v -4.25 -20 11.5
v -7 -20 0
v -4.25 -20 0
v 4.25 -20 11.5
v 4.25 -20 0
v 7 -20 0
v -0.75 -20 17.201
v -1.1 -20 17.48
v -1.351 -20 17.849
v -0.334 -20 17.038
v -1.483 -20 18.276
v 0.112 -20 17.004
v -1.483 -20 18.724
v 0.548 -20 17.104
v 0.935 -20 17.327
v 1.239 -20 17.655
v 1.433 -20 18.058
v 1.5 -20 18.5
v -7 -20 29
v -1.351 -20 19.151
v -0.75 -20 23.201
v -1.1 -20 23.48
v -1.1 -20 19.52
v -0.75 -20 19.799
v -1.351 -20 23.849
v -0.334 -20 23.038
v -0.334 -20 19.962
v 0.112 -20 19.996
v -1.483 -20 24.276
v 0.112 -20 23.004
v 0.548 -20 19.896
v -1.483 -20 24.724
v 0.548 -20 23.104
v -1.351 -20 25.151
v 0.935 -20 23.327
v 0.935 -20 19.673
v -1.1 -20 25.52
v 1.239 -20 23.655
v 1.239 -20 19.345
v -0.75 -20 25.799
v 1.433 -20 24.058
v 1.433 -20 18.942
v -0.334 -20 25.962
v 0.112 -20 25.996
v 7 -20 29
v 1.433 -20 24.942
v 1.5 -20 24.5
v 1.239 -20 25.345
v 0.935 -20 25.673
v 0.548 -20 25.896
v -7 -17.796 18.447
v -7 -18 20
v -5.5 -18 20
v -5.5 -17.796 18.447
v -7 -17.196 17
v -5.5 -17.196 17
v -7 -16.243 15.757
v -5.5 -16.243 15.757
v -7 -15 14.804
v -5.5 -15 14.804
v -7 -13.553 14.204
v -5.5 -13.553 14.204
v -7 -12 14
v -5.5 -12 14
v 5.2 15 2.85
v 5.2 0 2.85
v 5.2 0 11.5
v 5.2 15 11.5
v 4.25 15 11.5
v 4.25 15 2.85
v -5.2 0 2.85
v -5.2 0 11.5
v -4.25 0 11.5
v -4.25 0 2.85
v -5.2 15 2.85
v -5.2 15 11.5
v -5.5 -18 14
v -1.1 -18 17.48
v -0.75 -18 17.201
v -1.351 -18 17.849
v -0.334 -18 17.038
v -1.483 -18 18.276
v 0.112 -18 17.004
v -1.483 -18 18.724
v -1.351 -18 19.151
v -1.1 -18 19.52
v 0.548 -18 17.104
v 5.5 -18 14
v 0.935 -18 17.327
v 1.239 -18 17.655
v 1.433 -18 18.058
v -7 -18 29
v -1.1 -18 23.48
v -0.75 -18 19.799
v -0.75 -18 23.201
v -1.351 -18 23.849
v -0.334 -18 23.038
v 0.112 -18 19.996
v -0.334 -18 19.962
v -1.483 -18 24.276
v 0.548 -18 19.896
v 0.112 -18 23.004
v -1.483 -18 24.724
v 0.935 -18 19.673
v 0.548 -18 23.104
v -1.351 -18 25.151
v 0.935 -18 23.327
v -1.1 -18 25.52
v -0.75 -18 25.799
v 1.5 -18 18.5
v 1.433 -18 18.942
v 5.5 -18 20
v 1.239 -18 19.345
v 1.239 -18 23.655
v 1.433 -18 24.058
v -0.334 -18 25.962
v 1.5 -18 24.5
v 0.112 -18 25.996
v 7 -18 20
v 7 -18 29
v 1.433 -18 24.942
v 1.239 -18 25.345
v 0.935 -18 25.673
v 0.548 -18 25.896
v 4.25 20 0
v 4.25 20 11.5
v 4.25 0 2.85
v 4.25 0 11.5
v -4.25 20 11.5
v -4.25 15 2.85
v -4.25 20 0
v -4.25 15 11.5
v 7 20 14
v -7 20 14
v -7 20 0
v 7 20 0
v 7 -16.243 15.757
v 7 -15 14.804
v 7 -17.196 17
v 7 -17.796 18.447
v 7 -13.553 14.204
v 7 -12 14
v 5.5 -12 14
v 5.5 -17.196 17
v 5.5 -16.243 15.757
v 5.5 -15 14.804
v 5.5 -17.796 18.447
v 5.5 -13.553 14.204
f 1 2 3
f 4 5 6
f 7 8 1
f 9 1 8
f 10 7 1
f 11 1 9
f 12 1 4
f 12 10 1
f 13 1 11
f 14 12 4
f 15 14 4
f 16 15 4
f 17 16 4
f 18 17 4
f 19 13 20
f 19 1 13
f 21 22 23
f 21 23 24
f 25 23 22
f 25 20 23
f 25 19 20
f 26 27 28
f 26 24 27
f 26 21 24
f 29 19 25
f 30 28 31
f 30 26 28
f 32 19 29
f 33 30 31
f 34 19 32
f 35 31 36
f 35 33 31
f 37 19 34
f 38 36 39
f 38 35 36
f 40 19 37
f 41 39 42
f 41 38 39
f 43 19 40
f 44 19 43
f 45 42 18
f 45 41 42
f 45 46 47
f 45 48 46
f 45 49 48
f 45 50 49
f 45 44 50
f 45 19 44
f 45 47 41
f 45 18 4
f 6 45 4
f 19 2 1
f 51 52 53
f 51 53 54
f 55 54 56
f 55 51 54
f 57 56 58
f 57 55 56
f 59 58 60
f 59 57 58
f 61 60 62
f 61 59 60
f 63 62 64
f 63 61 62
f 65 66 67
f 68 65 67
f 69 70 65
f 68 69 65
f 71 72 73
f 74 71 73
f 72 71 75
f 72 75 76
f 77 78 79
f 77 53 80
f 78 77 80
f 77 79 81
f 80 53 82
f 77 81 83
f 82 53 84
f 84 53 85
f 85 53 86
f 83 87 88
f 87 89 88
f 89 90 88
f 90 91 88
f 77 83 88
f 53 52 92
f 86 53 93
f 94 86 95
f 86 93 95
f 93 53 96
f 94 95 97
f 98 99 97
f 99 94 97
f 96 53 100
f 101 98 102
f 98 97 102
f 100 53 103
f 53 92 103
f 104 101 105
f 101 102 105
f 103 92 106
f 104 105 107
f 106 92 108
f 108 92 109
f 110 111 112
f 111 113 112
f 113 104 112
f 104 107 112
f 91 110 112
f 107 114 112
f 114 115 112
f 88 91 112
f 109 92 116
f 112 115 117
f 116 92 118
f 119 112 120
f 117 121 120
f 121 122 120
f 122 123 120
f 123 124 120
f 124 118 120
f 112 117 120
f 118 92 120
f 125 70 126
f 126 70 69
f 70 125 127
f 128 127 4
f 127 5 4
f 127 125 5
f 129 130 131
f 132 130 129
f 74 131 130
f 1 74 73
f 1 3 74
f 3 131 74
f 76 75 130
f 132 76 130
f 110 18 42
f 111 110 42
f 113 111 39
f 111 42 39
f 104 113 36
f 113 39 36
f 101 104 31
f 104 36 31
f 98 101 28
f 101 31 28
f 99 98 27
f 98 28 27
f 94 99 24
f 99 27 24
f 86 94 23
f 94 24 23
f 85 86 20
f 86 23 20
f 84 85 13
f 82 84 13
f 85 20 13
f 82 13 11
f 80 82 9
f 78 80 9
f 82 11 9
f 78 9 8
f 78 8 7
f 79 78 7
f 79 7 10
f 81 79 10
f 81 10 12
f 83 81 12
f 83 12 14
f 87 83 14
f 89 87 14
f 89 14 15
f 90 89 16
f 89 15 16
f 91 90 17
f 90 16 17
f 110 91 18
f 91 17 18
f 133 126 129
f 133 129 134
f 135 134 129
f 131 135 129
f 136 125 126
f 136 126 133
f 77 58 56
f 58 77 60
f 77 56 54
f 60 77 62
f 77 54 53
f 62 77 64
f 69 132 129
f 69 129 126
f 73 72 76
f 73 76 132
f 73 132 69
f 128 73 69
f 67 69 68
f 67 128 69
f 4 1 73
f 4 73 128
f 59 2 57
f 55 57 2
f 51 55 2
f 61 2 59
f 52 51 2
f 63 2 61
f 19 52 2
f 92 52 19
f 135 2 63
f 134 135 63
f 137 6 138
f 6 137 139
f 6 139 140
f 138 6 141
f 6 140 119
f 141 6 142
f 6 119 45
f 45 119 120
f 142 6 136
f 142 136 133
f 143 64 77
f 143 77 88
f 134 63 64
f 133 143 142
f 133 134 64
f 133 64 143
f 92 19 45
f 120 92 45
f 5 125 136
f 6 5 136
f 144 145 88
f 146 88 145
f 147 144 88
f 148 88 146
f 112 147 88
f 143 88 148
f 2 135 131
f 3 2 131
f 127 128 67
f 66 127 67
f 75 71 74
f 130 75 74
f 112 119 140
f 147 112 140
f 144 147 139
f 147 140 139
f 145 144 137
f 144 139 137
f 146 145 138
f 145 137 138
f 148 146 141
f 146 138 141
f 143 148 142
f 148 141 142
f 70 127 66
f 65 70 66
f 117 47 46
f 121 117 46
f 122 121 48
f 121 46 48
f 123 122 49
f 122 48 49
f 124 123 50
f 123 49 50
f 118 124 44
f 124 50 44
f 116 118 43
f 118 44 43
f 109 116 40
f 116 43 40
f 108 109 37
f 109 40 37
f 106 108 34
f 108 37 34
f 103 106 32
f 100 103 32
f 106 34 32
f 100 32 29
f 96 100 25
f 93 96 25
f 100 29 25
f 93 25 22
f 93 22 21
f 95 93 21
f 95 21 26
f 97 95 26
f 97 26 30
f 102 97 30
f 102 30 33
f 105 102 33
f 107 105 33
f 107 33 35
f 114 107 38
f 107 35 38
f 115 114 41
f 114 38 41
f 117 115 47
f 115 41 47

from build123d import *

# Parameters (mm, degrees)
SKETCH1_W           = 14
SKETCH1_H           = 40
BOSS_EXTRUDE1_DEPTH = 14
SKETCH2_W           = 10.4
SKETCH2_H           = 8.65
SKETCH2_W_2         = 8.5
SKETCH2_H_2         = 2.85
CUT_EXTRUDE1_DEPTH  = 35
SKETCH3_W           = 14
SKETCH3_H           = 15
SKETCH3_R           = 1.5
BOSS_EXTRUDE2_DEPTH = 2
BOSS_EXTRUDE3_DEPTH = 1.5
SKETCH5_W           = 8.5
SKETCH5_H           = 11.5
CUT_EXTRUDE2_DEPTH  = 46.98912915
SKETCH7_W           = 0.95
SKETCH7_H           = 8.65
BOSS_EXTRUDE4_DEPTH = 20


with BuildPart() as part:
    # Sketch1 → Boss-Extrude1 (new body)
    with BuildSketch(Plane.XY):
        Rectangle(SKETCH1_W, SKETCH1_H)
    extrude(amount=BOSS_EXTRUDE1_DEPTH)

    # Sketch2 → Cut-Extrude1 (cut)
    with BuildSketch(Plane.XZ.offset(20)):
        with Locations((0, 7.175)):
            Rectangle(SKETCH2_W, SKETCH2_H)
        with Locations((0, 1.425)):
            Rectangle(SKETCH2_W_2, SKETCH2_H_2)
    extrude(amount=-CUT_EXTRUDE1_DEPTH, mode=Mode.SUBTRACT)

    # Sketch3 → Boss-Extrude2 (add)
    with BuildSketch(Plane.XZ.offset(20)):
        with Locations((0, 21.5)):
            Rectangle(SKETCH3_W, SKETCH3_H)
        with Locations((0, 18.5)):
            Circle(SKETCH3_R, mode=Mode.SUBTRACT)
        with Locations((0, 24.5)):
            Circle(SKETCH3_R, mode=Mode.SUBTRACT)
    extrude(amount=-BOSS_EXTRUDE2_DEPTH)

    # Sketch4 → Boss-Extrude3 (add)
    with BuildSketch(Plane.ZY.offset(7)):
        with BuildLine():
            Line((14, -12), (14, -18))
            Line((14, -18), (20, -18))
            ThreePointArc((20, -18), (15.757359313, -16.242640687), (14, -12))
        make_face()
    boss_extrude3 = extrude(amount=-BOSS_EXTRUDE3_DEPTH)

    # Mirror1: Boss-Extrude3 across plane
    add(boss_extrude3.mirror(Plane(origin=(0, 0, 0), x_dir=(0, 0, 1), z_dir=(1, 0, 0))))

    # Sketch5 → Cut-Extrude2 (cut, through all)
    with BuildSketch(Plane.XZ.offset(-15)):
        with Locations((0, 5.75)):
            Rectangle(SKETCH5_W, SKETCH5_H)
    extrude(amount=-CUT_EXTRUDE2_DEPTH, mode=Mode.SUBTRACT)

    # Sketch7 → Boss-Extrude4 (add)
    with BuildSketch(Plane.XZ.offset(20)):
        with Locations((4.725, 7.175)):
            Rectangle(SKETCH7_W, SKETCH7_H)
        with Locations((-4.725, 7.175)):
            Rectangle(SKETCH7_W, SKETCH7_H)
    extrude(amount=-BOSS_EXTRUDE4_DEPTH)


solid = part.part
